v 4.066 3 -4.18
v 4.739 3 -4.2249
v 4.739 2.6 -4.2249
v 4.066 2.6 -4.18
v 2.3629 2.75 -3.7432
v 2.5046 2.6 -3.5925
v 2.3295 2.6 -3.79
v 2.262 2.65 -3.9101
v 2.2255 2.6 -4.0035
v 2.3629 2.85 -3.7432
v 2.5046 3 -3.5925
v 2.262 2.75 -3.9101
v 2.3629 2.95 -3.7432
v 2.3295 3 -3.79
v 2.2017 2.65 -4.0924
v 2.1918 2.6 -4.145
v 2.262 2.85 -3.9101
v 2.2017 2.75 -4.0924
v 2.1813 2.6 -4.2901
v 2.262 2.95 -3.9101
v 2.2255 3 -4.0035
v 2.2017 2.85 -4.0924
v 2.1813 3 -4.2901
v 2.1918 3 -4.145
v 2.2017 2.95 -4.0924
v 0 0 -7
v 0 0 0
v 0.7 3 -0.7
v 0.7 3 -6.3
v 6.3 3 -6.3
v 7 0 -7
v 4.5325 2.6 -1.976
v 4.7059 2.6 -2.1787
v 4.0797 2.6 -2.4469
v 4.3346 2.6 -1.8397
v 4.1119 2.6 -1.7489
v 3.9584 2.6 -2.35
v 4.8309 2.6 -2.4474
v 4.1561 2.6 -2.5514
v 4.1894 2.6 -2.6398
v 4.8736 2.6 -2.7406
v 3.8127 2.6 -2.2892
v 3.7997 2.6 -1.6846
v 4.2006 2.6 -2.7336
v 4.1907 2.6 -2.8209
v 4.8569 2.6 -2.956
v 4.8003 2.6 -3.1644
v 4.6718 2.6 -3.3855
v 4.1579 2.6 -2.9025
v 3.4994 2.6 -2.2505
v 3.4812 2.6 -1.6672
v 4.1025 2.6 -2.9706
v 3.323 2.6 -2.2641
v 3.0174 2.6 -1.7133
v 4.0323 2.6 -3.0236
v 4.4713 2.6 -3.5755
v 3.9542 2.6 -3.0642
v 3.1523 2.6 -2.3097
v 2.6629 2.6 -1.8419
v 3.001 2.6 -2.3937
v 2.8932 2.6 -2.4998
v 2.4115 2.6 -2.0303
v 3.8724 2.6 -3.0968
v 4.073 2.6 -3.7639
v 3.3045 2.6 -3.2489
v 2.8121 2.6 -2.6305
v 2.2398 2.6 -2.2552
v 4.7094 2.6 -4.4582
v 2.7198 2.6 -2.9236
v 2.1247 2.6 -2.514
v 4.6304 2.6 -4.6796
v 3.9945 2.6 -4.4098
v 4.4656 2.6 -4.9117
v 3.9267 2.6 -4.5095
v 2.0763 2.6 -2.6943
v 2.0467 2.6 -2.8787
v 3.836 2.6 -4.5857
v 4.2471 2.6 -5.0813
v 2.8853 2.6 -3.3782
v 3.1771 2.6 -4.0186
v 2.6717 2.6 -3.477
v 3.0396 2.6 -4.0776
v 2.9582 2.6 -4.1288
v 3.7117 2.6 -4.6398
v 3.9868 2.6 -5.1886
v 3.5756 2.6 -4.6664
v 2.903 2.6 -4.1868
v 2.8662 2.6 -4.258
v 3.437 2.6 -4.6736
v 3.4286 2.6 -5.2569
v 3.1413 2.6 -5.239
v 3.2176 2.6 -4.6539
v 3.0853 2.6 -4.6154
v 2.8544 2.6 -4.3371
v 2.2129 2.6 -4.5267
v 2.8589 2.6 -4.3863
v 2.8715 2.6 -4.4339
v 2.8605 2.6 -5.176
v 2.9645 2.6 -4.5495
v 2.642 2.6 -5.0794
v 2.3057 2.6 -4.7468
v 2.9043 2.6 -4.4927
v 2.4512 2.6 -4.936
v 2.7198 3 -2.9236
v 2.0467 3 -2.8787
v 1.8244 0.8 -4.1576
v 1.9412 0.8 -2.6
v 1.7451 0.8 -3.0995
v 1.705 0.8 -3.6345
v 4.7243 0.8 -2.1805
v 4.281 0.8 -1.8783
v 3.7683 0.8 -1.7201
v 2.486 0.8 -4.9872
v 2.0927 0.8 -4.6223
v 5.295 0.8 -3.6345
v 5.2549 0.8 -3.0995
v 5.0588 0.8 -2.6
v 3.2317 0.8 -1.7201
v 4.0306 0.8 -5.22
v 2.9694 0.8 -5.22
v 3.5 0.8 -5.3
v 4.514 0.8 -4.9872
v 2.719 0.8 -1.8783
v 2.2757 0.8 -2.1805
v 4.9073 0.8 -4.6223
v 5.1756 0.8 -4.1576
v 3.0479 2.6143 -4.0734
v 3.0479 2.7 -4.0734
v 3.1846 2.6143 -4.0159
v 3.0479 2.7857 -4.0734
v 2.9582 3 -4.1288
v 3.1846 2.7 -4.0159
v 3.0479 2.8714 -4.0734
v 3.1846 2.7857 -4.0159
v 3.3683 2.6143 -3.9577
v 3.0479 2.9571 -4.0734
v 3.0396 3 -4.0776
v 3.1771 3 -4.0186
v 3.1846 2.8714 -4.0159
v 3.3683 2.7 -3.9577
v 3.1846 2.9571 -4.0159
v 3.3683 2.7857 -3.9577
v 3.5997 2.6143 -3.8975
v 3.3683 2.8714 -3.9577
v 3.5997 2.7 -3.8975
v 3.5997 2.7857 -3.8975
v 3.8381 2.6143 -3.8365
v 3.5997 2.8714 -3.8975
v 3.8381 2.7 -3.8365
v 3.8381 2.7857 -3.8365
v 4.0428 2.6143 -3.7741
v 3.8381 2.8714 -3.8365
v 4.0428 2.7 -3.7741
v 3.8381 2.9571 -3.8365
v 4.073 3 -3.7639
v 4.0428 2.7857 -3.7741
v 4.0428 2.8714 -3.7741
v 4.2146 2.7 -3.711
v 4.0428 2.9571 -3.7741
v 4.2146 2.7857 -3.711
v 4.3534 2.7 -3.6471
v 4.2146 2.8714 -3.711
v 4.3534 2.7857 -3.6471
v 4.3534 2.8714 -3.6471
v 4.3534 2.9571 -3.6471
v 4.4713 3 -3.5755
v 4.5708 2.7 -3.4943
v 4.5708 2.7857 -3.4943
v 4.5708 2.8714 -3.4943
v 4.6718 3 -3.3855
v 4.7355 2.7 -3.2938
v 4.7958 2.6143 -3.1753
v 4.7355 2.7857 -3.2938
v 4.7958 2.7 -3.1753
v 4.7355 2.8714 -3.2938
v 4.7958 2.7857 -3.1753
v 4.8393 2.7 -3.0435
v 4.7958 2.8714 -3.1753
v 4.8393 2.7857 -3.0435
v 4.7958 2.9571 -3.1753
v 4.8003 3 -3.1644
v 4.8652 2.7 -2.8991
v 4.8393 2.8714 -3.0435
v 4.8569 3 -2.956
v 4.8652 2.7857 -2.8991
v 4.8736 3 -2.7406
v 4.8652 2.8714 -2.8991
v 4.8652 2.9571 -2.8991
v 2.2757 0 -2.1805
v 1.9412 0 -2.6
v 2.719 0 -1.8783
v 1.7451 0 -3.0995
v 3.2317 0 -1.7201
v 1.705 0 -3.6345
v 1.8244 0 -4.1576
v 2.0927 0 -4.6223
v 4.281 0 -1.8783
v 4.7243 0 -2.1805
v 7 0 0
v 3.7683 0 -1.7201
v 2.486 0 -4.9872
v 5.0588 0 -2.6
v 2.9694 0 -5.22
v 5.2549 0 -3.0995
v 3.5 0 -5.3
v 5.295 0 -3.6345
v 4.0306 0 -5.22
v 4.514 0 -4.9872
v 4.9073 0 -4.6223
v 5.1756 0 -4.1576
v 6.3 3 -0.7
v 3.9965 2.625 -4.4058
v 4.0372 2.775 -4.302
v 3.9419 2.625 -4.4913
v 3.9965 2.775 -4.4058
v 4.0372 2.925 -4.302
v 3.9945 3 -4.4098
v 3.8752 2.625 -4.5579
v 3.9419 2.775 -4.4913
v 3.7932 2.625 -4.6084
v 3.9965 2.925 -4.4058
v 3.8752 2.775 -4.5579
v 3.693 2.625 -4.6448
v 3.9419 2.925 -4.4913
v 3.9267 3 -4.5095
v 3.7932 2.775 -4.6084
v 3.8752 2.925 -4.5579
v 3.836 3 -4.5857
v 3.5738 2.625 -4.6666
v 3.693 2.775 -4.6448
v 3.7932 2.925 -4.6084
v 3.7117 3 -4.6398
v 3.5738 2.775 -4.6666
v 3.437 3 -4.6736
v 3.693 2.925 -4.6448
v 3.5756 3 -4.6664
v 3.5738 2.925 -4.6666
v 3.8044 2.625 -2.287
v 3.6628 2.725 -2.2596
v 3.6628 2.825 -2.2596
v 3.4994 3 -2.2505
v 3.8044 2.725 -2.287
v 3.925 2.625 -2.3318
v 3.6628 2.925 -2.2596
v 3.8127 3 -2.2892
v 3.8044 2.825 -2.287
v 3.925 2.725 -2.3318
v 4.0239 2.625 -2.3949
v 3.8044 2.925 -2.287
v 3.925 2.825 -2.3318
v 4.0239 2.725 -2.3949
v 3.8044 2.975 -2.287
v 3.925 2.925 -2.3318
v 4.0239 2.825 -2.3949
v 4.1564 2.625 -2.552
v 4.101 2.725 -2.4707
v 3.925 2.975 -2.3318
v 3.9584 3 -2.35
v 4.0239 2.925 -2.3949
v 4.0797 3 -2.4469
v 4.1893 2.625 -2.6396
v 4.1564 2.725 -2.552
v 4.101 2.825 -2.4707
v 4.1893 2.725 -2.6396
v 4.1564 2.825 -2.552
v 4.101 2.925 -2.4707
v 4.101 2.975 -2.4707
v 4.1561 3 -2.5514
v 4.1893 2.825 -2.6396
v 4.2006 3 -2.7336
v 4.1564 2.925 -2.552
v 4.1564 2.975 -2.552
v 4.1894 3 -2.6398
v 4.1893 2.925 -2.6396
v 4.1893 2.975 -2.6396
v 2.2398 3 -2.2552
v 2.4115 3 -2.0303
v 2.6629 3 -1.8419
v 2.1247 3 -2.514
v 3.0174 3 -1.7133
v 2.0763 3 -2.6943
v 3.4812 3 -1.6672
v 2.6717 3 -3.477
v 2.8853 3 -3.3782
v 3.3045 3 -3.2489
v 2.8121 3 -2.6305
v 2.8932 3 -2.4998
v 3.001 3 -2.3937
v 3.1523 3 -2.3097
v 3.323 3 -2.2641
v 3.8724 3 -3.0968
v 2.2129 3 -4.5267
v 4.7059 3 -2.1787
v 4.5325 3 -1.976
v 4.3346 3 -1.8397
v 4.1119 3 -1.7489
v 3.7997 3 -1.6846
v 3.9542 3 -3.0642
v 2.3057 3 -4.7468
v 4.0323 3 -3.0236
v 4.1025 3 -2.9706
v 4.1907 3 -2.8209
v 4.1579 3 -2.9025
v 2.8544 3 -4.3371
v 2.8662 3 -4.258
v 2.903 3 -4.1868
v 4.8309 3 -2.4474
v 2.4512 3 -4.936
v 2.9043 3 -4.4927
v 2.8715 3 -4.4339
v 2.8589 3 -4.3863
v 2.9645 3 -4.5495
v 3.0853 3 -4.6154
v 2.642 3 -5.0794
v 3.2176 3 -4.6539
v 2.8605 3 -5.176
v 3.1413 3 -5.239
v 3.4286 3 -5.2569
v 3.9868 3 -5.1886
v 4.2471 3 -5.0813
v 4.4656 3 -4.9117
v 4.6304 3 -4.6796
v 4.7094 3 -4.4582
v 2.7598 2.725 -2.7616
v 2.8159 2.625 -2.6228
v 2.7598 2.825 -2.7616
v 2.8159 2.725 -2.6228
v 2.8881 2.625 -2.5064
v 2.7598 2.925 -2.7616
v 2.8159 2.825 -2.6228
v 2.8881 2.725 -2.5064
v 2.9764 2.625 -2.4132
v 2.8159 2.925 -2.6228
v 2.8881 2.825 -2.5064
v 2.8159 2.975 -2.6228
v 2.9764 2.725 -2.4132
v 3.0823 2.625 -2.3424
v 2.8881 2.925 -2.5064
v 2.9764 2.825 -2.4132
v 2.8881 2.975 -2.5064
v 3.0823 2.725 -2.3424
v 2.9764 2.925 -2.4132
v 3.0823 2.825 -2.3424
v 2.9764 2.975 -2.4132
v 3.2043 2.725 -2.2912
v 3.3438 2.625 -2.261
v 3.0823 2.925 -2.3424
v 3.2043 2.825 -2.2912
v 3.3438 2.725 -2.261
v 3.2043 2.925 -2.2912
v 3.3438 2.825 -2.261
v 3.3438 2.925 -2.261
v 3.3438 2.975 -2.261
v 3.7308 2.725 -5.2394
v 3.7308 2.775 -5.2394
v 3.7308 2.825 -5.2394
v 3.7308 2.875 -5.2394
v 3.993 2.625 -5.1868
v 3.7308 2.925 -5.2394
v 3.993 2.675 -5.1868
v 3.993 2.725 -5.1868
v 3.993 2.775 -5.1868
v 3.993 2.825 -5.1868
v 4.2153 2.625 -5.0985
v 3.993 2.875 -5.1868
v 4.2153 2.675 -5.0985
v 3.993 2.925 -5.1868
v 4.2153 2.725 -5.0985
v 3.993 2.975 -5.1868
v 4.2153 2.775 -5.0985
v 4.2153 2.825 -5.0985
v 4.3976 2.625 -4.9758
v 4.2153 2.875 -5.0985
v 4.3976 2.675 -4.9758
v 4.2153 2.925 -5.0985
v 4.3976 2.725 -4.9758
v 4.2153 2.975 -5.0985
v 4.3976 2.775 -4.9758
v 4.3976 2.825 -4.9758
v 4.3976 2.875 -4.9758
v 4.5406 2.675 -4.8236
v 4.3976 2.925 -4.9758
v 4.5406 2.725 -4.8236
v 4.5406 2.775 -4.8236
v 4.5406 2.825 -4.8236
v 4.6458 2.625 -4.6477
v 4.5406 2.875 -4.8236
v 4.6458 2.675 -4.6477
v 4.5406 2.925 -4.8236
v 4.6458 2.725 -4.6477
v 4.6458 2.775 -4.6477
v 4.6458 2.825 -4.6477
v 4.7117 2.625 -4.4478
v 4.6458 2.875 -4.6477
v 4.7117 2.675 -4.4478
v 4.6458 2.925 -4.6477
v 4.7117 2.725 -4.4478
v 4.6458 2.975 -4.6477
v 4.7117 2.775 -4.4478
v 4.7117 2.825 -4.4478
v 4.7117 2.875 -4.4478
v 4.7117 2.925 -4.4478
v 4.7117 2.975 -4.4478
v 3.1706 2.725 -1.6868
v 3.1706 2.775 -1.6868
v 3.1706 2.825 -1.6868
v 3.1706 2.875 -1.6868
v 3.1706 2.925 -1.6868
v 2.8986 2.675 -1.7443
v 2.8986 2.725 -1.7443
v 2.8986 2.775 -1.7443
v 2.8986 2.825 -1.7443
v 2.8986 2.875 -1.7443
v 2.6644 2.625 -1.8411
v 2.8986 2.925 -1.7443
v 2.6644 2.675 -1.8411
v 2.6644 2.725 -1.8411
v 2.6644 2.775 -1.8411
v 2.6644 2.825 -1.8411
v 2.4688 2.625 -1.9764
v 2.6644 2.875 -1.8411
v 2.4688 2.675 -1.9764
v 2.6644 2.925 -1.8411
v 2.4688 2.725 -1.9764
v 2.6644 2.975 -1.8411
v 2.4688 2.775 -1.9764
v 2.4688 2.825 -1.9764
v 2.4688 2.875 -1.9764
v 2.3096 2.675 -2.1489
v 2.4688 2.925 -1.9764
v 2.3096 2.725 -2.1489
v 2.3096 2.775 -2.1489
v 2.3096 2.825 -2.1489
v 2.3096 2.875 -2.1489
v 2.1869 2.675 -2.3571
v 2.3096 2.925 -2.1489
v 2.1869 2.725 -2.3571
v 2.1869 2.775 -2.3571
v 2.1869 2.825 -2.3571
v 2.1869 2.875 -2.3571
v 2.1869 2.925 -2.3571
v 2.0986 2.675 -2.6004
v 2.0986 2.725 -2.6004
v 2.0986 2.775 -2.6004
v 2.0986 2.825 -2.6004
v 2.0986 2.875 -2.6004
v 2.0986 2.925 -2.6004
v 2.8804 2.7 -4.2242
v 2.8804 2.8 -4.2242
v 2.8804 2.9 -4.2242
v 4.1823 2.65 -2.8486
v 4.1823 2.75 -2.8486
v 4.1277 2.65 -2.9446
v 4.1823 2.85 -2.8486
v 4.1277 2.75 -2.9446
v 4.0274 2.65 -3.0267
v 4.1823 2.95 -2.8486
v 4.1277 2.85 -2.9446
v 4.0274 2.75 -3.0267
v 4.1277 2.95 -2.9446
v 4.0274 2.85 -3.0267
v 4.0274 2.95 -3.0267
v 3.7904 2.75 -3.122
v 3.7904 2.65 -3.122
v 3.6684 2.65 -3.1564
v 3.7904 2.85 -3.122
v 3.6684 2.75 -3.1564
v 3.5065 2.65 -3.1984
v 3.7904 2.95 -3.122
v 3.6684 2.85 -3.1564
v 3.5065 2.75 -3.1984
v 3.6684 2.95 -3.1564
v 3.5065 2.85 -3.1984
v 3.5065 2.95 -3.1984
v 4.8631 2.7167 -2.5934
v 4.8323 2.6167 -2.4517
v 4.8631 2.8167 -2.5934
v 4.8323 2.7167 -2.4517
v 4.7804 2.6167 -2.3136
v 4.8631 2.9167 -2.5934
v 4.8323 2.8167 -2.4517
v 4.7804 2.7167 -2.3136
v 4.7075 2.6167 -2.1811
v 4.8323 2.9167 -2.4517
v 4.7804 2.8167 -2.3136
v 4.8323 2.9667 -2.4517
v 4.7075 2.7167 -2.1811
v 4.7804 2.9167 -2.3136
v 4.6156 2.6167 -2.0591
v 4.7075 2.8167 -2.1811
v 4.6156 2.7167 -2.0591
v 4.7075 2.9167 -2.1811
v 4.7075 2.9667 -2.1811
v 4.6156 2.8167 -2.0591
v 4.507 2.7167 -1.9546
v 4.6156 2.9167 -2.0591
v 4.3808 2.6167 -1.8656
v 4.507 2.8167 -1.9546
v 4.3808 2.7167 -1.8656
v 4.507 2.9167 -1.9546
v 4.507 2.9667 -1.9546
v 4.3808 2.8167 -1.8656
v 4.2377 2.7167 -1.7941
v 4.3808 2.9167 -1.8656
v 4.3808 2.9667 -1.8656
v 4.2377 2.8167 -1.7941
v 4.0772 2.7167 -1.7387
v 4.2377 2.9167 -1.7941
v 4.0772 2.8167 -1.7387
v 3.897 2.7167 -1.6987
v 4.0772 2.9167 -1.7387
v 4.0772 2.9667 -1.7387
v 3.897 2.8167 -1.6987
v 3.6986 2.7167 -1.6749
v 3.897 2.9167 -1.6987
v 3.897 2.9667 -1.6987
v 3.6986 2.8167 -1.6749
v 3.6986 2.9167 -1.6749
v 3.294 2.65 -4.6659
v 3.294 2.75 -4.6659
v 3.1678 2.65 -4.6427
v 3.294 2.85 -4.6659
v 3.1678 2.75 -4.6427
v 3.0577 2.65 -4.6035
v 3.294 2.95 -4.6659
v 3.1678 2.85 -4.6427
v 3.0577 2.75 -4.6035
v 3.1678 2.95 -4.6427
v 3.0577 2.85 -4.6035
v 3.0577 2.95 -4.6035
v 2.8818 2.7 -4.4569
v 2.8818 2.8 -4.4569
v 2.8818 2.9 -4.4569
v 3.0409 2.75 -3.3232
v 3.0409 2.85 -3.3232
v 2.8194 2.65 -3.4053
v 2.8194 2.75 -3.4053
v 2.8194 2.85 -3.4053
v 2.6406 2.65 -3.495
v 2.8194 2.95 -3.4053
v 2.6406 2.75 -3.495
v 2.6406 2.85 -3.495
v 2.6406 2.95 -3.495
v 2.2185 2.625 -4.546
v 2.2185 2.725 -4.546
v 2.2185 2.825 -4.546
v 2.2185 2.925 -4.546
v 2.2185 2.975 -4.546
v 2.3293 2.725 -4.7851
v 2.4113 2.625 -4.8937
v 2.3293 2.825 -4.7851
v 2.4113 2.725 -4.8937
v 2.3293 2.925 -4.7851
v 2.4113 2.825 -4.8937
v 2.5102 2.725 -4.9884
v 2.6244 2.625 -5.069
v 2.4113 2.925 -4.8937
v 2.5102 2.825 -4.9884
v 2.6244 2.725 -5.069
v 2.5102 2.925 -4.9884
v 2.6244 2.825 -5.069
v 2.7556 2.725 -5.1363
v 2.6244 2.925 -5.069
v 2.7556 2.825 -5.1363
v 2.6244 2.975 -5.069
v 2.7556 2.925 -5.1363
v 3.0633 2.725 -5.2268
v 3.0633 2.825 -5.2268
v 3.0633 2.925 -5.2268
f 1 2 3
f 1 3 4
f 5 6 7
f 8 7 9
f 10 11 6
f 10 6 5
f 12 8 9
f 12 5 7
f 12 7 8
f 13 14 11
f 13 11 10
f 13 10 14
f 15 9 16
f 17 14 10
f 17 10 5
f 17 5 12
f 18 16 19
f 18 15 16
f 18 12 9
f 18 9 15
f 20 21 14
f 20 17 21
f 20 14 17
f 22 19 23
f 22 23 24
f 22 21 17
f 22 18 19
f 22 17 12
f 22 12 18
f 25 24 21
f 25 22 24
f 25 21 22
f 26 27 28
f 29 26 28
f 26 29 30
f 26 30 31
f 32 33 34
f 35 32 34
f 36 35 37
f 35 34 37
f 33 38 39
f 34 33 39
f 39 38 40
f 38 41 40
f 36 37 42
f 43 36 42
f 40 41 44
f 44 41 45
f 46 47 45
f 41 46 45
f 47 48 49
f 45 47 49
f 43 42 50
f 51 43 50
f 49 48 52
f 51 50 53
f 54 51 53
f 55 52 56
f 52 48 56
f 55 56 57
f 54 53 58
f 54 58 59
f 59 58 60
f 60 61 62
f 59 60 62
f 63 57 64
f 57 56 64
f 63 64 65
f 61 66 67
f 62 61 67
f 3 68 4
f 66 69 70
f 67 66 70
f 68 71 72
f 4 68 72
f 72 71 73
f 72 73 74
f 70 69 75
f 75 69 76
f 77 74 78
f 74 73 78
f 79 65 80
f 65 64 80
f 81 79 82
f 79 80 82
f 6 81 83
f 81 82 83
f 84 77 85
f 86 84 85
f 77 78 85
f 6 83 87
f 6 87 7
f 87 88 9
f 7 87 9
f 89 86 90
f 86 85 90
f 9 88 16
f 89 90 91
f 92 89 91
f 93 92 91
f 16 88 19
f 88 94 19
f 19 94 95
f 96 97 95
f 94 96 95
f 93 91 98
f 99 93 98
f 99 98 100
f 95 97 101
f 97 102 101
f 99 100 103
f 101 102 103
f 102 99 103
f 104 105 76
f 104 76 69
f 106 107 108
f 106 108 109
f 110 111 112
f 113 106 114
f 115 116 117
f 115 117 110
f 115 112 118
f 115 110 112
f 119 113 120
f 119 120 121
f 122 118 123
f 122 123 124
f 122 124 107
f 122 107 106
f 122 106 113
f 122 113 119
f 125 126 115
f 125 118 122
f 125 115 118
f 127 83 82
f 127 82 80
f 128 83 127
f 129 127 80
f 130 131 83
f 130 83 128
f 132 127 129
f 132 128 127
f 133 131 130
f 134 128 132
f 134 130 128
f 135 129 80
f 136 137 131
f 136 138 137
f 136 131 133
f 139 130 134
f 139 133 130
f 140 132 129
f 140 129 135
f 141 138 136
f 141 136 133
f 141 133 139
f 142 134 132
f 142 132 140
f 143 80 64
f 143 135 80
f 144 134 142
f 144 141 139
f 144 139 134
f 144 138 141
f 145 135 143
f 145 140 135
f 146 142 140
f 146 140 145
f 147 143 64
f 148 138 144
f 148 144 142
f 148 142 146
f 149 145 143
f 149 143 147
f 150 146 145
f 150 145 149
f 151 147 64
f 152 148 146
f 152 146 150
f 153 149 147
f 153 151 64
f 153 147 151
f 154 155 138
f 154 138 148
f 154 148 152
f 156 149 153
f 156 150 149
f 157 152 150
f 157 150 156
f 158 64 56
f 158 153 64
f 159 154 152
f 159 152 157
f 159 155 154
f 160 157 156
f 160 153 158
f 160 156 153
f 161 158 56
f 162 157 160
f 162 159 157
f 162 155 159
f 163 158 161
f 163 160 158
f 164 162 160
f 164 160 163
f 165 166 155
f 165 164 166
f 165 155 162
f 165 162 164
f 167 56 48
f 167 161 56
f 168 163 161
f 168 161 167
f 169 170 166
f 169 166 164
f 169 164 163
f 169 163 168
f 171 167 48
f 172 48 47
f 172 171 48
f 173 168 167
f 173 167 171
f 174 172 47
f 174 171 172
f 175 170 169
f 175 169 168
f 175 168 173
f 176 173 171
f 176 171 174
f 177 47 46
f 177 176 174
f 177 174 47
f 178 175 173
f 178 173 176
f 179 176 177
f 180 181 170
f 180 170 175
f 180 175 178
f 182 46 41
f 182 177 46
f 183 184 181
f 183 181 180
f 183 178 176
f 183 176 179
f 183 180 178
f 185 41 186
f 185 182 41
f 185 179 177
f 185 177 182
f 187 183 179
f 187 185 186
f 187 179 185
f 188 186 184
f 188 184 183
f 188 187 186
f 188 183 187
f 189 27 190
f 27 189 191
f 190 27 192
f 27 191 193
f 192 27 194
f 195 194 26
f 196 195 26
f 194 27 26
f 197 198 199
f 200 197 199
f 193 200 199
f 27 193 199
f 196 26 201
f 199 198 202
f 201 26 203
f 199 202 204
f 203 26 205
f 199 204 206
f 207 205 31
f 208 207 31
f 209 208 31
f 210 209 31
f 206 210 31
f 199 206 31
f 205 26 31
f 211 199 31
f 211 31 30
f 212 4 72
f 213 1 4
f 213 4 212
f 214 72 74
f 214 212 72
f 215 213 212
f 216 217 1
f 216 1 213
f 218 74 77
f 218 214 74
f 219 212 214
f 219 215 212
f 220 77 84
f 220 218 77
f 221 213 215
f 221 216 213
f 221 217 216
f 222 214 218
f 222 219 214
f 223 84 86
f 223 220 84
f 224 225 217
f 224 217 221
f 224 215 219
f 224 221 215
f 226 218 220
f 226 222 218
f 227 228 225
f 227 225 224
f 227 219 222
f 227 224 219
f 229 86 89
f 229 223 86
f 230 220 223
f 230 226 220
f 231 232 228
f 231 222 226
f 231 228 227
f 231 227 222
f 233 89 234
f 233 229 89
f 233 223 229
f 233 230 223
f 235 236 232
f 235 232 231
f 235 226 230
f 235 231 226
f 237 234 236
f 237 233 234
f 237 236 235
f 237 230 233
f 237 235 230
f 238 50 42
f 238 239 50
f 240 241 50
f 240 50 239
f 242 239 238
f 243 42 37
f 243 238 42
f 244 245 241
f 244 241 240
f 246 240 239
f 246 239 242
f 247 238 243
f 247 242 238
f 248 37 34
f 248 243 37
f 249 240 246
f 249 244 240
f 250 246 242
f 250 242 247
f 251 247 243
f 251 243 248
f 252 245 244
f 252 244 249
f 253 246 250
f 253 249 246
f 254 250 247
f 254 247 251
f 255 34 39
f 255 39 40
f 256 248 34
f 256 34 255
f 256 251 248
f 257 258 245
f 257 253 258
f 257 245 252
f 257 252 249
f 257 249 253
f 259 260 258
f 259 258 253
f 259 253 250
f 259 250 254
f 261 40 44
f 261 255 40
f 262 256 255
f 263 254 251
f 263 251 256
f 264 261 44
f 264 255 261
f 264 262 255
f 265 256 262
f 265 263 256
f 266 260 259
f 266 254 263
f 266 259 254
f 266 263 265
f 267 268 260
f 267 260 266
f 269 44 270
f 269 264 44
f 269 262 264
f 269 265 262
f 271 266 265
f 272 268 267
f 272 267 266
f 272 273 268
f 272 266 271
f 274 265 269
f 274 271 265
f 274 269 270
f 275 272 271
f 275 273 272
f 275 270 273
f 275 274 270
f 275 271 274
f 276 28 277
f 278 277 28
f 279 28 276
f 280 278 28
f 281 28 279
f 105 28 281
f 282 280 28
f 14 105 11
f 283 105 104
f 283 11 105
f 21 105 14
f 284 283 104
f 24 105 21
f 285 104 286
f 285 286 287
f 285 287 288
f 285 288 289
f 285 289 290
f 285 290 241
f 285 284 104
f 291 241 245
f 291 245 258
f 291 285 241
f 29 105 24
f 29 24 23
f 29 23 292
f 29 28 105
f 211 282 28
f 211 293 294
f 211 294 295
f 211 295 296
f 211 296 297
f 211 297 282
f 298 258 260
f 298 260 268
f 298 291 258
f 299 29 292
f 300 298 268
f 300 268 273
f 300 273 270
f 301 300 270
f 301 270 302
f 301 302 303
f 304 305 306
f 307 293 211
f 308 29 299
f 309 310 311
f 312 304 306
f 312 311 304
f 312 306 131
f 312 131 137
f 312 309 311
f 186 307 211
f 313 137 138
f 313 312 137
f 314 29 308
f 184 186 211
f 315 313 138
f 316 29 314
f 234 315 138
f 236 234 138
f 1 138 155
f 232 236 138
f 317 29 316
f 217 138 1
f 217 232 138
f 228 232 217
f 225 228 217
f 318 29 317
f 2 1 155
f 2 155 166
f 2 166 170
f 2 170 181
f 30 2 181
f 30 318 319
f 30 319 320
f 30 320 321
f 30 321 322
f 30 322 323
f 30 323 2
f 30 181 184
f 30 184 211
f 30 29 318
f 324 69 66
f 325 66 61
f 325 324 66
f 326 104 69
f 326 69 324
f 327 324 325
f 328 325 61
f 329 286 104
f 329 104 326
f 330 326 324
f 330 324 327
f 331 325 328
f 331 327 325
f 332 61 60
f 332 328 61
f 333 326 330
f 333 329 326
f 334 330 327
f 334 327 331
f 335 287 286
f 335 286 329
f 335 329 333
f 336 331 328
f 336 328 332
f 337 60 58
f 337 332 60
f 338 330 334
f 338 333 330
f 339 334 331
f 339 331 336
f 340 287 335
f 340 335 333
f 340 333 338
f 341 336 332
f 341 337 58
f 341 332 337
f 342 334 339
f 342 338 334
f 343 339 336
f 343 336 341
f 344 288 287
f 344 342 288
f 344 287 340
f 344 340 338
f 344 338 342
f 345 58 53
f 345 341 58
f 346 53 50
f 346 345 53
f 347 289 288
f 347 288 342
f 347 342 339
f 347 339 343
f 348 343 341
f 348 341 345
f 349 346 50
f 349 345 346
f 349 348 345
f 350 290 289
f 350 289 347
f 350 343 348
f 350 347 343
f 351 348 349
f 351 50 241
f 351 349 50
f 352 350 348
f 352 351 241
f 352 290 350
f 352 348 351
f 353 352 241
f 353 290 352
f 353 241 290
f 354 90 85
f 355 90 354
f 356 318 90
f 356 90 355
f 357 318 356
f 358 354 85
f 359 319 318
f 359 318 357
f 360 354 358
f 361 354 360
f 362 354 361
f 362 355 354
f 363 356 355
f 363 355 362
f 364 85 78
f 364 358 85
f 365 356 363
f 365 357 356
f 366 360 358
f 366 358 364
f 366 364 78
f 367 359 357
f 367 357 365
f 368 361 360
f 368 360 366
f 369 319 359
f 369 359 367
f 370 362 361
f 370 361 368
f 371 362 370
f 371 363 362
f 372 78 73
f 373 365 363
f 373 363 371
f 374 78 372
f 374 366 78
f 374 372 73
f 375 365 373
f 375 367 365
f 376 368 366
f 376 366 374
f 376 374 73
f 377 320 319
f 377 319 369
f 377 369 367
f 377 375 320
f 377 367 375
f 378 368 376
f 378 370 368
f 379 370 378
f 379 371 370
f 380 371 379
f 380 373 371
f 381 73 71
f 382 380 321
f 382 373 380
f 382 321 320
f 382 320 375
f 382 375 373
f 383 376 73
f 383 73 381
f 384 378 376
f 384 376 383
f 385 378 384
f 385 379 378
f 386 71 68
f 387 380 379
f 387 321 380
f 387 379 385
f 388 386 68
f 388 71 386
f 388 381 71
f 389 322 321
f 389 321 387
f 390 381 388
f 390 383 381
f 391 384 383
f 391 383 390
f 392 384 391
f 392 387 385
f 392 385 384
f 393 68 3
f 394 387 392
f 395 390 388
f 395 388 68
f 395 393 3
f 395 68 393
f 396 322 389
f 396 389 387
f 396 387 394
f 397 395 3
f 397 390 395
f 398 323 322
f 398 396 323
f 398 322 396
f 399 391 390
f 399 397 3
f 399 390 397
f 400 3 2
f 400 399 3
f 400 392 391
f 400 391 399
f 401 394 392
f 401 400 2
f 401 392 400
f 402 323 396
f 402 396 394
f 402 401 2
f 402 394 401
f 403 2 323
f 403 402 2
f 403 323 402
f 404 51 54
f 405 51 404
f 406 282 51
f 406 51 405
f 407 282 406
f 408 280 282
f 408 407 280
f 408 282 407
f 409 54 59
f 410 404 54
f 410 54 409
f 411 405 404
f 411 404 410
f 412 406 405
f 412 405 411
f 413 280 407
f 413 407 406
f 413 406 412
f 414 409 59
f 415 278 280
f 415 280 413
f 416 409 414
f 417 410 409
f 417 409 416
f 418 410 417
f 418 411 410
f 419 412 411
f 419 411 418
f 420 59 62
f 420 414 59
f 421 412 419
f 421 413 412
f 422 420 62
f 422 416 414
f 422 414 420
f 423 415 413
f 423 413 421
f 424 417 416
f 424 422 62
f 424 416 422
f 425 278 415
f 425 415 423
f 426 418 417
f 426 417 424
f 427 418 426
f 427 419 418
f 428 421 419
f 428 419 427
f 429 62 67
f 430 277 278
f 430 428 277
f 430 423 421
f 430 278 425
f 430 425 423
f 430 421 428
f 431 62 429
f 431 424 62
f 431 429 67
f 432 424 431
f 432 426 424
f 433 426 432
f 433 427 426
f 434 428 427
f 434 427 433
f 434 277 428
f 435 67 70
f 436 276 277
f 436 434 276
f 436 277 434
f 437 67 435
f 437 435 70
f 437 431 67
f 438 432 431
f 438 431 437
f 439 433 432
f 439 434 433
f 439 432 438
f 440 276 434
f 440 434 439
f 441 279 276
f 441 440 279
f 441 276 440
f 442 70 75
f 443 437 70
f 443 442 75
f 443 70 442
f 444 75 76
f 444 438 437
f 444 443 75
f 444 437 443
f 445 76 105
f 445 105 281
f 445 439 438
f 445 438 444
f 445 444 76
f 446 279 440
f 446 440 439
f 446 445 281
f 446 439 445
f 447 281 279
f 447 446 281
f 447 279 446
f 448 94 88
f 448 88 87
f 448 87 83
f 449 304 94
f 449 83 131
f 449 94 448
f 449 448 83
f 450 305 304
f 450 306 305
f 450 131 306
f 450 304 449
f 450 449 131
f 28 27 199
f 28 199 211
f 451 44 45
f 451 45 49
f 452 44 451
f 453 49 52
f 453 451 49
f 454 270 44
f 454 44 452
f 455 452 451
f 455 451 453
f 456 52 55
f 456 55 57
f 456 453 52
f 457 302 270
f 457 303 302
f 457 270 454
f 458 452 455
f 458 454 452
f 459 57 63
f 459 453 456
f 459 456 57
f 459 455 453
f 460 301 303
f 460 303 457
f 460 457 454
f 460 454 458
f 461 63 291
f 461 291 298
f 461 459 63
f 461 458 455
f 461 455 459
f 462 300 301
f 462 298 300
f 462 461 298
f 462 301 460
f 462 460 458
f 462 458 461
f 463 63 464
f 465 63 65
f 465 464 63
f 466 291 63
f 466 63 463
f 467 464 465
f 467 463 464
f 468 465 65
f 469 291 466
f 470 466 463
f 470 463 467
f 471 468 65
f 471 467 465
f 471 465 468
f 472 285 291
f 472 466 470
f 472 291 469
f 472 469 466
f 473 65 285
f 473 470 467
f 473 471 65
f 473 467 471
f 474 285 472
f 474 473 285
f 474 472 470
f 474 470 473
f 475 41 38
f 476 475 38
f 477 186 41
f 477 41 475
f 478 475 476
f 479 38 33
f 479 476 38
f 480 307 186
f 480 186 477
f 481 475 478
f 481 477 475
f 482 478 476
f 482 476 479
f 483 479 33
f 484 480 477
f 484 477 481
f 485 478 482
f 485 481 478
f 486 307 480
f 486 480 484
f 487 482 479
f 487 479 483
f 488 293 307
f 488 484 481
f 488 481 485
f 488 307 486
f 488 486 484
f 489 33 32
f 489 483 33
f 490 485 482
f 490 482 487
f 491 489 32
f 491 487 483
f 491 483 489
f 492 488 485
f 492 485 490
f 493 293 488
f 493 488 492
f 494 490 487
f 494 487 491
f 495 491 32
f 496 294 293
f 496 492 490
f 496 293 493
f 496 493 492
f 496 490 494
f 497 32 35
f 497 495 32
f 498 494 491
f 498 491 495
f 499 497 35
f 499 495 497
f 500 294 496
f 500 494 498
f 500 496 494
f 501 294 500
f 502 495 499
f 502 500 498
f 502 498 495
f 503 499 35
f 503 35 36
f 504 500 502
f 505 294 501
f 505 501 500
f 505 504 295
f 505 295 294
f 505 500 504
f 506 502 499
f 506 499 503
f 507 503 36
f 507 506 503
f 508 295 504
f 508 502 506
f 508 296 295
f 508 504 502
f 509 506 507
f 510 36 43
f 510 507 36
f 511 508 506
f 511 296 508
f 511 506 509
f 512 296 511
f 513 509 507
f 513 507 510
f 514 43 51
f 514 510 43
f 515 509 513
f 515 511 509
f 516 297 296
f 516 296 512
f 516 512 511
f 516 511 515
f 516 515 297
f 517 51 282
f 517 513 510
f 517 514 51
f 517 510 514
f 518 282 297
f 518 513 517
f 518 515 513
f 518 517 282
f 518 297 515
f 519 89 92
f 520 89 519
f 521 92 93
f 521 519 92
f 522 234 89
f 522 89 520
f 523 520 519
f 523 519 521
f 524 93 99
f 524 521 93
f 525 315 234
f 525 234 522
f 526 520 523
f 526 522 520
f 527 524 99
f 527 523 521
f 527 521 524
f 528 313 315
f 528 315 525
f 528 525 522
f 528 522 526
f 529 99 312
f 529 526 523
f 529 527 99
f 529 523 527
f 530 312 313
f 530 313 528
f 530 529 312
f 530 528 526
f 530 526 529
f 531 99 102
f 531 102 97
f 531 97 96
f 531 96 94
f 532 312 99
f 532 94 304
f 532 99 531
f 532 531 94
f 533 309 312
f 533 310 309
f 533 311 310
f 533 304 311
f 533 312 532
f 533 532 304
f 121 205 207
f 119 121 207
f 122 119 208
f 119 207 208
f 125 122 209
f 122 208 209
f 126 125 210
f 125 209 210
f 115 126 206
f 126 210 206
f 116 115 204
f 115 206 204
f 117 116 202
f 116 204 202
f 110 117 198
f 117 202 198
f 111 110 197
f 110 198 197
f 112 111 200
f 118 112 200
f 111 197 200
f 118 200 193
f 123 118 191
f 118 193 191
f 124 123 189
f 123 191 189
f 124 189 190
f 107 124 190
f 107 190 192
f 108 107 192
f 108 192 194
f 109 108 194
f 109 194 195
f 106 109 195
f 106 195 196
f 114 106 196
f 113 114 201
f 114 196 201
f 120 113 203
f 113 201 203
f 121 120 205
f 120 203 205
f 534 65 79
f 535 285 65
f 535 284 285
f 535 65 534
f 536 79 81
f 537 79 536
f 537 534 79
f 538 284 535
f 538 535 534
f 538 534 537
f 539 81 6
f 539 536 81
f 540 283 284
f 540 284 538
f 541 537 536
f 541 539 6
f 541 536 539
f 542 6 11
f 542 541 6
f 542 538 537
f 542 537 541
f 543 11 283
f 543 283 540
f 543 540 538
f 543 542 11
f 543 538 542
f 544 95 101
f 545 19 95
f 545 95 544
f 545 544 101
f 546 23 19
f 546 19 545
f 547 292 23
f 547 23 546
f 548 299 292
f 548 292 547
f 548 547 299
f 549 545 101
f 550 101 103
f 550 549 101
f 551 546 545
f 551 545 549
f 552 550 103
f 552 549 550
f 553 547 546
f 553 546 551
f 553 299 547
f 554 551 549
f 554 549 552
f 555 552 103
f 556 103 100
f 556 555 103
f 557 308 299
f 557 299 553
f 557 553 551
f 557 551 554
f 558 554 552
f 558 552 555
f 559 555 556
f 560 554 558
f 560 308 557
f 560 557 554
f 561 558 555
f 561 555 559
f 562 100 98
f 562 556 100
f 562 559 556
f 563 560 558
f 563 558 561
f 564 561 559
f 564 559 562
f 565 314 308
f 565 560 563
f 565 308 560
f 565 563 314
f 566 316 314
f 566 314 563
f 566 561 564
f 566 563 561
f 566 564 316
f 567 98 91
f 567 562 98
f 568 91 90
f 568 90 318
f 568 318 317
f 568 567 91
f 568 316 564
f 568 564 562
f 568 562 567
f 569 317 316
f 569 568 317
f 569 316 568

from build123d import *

# Parameters (mm, degrees)
SKETCH1_W           = 7
SKETCH1_H           = 7
BOSS_EXTRUDE1_DEPTH = 3
CUT_EXTRUDE1_DEPTH  = 7
CUT_EXTRUDE2_DEPTH  = 11
SKETCH4_R           = 1.8
CUT_EXTRUDE3_DEPTH  = 0.8
CUT_EXTRUDE4_DEPTH  = 0.4


with BuildPart() as part:
    # Sketch1 → Boss-Extrude1 (new body)
    with BuildSketch(Plane(origin=(0, 0, 0), x_dir=(1, 0, 0), z_dir=(0, 1, 0))):
        with Locations((3.5, 3.5)):
            Rectangle(SKETCH1_W, SKETCH1_H)
    extrude(amount=BOSS_EXTRUDE1_DEPTH)

    # Sketch2 → Cut-Extrude1 (cut)
    with BuildSketch(Plane.XY):
        Polygon((0, 0), (0.7, 3), (0, 3), align=None)
        Polygon((7, 0), (6.3, 3), (7, 3), align=None)
    extrude(amount=-CUT_EXTRUDE1_DEPTH, mode=Mode.SUBTRACT)

    # Sketch3 → Cut-Extrude2 (cut)
    with BuildSketch(Plane(origin=(0, 0, 0), x_dir=(0, 0, -1), z_dir=(1, 0, 0))):
        Polygon((0, 0), (0.7, 3), (0, 3), align=None)
        Polygon((7, 3), (6.3, 3), (7, 0), align=None)
    extrude(amount=CUT_EXTRUDE2_DEPTH, mode=Mode.SUBTRACT)

    # Sketch4 → Cut-Extrude3 (cut)
    with BuildSketch(Plane.XZ):
        with Locations(Location((3.5, -3.5, 0), (0, 0, 270))):
            Circle(SKETCH4_R)
    extrude(amount=-CUT_EXTRUDE3_DEPTH, mode=Mode.SUBTRACT)

    # Sketch5 → Cut-Extrude4 (cut)
    with BuildSketch(Plane(origin=(0, 3, 0), x_dir=(1, 0, 0), z_dir=(0, 1, 0))):
        with BuildLine():
            Line((2.046721013, 2.878720245), (2.719797936, 2.92359204))
            add(Edge.make_bspline(
                [(2.719797936, 2.92359204), (2.725160149, 2.895432871), (2.735575908, 2.840735478), (2.758717767, 2.762784225), (2.784190549, 2.69011155), (2.81463192, 2.623496744), (2.847957445, 2.561708471), (2.886904829, 2.506506929), (2.928757004, 2.456129675), (2.975585733, 2.412386043), (3.026605026, 2.374074766), (3.082069463, 2.341401632), (3.14137804, 2.313122445), (3.204675773, 2.289835431), (3.272615043, 2.272451562), (3.344603998, 2.260083969), (3.420745884, 2.252164104), (3.4727828, 2.251073777), (3.499445372, 2.250515117)],
                knots=[0, 0, 0, 0, 1.204560339, 2.339781841, 3.415289417, 4.440034832, 5.416475564, 6.362424008, 7.275913008, 8.16578645, 9.05021719, 9.95355393, 10.867835453, 11.809845306, 12.784702352, 13.812224031, 14.87903166, 16, 16, 16, 16], degree=3))
            add(Edge.make_bspline(
                [(3.499445372, 2.250515117), (3.527509416, 2.250821294), (3.582095427, 2.251416824), (3.661196592, 2.258804896), (3.735159775, 2.269389104), (3.803331854, 2.286143658), (3.866985877, 2.304880975), (3.924540945, 2.330515622), (3.976928433, 2.36008148), (4.024013382, 2.393631069), (4.06510446, 2.430839971), (4.101052986, 2.469684857), (4.132361778, 2.5093265), (4.157004013, 2.551524023), (4.176946643, 2.594570783), (4.190127325, 2.639750939), (4.199031656, 2.686027058), (4.200052723, 2.717653631), (4.200567167, 2.733588033)],
                knots=[0, 0, 0, 0, 1.417779877, 2.757654889, 4.012140507, 5.189587551, 6.302846416, 7.360586765, 8.365575446, 9.33904572, 10.275781718, 11.161696098, 12.012180333, 12.822428111, 13.625933072, 14.403138519, 15.195454004, 16, 16, 16, 16], degree=3))
            add(Edge.make_bspline(
                [(4.200567167, 2.733588033), (4.199936245, 2.753552546), (4.198701939, 2.792610195), (4.183842132, 2.848447381), (4.161557458, 2.900178921), (4.12800444, 2.94704074), (4.082900924, 2.989865612), (4.025366896, 3.029927231), (3.953796381, 3.065967021), (3.900700369, 3.086070082), (3.872442167, 3.096769123)],
                knots=[0, 0, 0, 0, 0.90494901, 1.770400303, 2.607161909, 3.452839393, 4.36912122, 5.420987164, 6.627424851, 8, 8, 8, 8], degree=3))
            add(Edge.make_bspline(
                [(3.872442167, 3.096769123), (3.860317321, 3.100832215), (3.833183883, 3.109924755), (3.786897121, 3.12292623), (3.731143485, 3.139161617), (3.665117302, 3.157615727), (3.588840772, 3.176489423), (3.503165804, 3.199739676), (3.407047926, 3.222875577), (3.339803742, 3.239954494), (3.304533513, 3.248912553)],
                knots=[0, 0, 0, 0, 0.521821638, 1.167752076, 1.961721917, 2.891982557, 3.96540661, 5.168436773, 6.514817513, 8, 8, 8, 8], degree=3))
            add(Edge.make_bspline(
                [(3.304533513, 3.248912553), (3.258601207, 3.260380777), (3.169982333, 3.282506842), (3.043591527, 3.321867543), (2.927183282, 3.360974579), (2.821878423, 3.403407811), (2.726515392, 3.446291426), (2.642636716, 3.492636137), (2.568492031, 3.540035098), (2.525286202, 3.57546224), (2.504553545, 3.592462232)],
                knots=[0, 0, 0, 0, 1.293880989, 2.496331788, 3.617634808, 4.64976062, 5.598842568, 6.473791081, 7.267636666, 8, 8, 8, 8], degree=3))
            add(Edge.make_bspline(
                [(2.504553545, 3.592462232), (2.478842356, 3.616535508), (2.428433193, 3.663733391), (2.362077353, 3.741288571), (2.306320379, 3.82321321), (2.260426285, 3.908902595), (2.225088701, 3.998850035), (2.200041876, 4.092453462), (2.18383066, 4.189957168), (2.182176417, 4.256359502), (2.181336398, 4.290078418)],
                knots=[0, 0, 0, 0, 1.064429417, 2.086912298, 3.078678339, 4.055528992, 5.020032834, 5.993708893, 6.981211098, 8, 8, 8, 8], degree=3))
            add(Edge.make_bspline(
                [(2.181336398, 4.290078418), (2.182972343, 4.333710293), (2.18621757, 4.420262908), (2.215978417, 4.547483438), (2.262337684, 4.670241451), (2.316103441, 4.767715859), (2.367760734, 4.841455617), (2.410658355, 4.894370593), (2.457785536, 4.943893923), (2.509787819, 4.988817578), (2.564734232, 5.031772991), (2.624753609, 5.069917913), (2.688144219, 5.105848319), (2.779877653, 5.148442144), (2.904426487, 5.192829094), (3.06647121, 5.230244475), (3.242905826, 5.252735952), (3.365228488, 5.25549518), (3.428632071, 5.256925373)],
                knots=[0, 0, 0, 0, 1.180131776, 2.341029169, 3.518901375, 4.725685298, 5.343762192, 5.955650671, 6.568945152, 7.192346361, 7.815201106, 8.455999361, 9.116257477, 9.787318263, 11.192748436, 12.688084276, 14.283332633, 16, 16, 16, 16], degree=3))
            add(Edge.make_bspline(
                [(3.428632071, 5.256925373), (3.480546978, 5.25623114), (3.581520363, 5.254880873), (3.727893013, 5.241226755), (3.86461301, 5.219975735), (3.991200587, 5.189469994), (4.107714725, 5.149163904), (4.214607068, 5.10115173), (4.311786782, 5.044149232), (4.3980708, 4.977829293), (4.474941591, 4.904715813), (4.541999061, 4.824854673), (4.599499587, 4.739254471), (4.647814268, 4.647977762), (4.68575566, 4.550555251), (4.713622114, 4.447108501), (4.732053229, 4.337881002), (4.736673044, 4.263037228), (4.739028705, 4.224874091)],
                knots=[0, 0, 0, 0, 1.325124071, 2.577337985, 3.749592149, 4.855247722, 5.896868755, 6.892903601, 7.842551483, 8.766257401, 9.665194363, 10.546067736, 11.423174165, 12.293291263, 13.177512979, 14.086532529, 15.024315359, 16, 16, 16, 16], degree=3))
            Line((4.739028705, 4.224874091), (4.065951782, 4.180002296))
            add(Edge.make_bspline(
                [(4.065951782, 4.180002296), (4.062068972, 4.201108183), (4.054501777, 4.242241362), (4.038048624, 4.301152432), (4.019490266, 4.355638451), (3.997768669, 4.405699072), (3.971531605, 4.45043766), (3.942978139, 4.491261716), (3.911320612, 4.527627281), (3.875510829, 4.55853855), (3.83677937, 4.586666537), (3.792639157, 4.60921177), (3.744939713, 4.630128784), (3.691866364, 4.645853249), (3.634438311, 4.65832646), (3.572622102, 4.667573288), (3.506289601, 4.672088109), (3.460655286, 4.673079253), (3.437045532, 4.67359204)],
                knots=[0, 0, 0, 0, 1.151066407, 2.24330871, 3.278475654, 4.238599069, 5.165719782, 6.056502506, 6.909492653, 7.744782051, 8.590364415, 9.471203867, 10.39832458, 11.382154319, 12.435022857, 13.550631277, 14.73277401, 16, 16, 16, 16], degree=3))
            add(Edge.make_bspline(
                [(3.437045532, 4.67359204), (3.412497837, 4.673139334), (3.364739198, 4.672258574), (3.295142133, 4.666853479), (3.229854863, 4.656876194), (3.168556746, 4.643888244), (3.11132966, 4.626219037), (3.058294374, 4.604674333), (3.009208245, 4.579309585), (2.979277664, 4.559353476), (2.964489443, 4.549493482)],
                knots=[0, 0, 0, 0, 1.186678824, 2.308736671, 3.37120409, 4.377216403, 5.334874112, 6.262130804, 7.141346615, 8, 8, 8, 8], degree=3))
            add(Edge.make_bspline(
                [(2.964489443, 4.549493482), (2.947565565, 4.53602445), (2.914789266, 4.509939115), (2.879515034, 4.458142509), (2.858279864, 4.399639797), (2.855723971, 4.358268553), (2.854413321, 4.337053578)],
                knots=[0, 0, 0, 0, 1.037857257, 2.010007357, 2.979541333, 4, 4, 4, 4], degree=3))
            add(Edge.make_bspline(
                [(2.854413321, 4.337053578), (2.855485194, 4.317226776), (2.857596612, 4.27817113), (2.878892988, 4.22269174), (2.911643913, 4.171286094), (2.942244281, 4.143361874), (2.958179346, 4.128820405)],
                knots=[0, 0, 0, 0, 0.98538058, 1.941042925, 2.927803204, 4, 4, 4, 4], degree=3))
            add(Edge.make_bspline(
                [(2.958179346, 4.128820405), (2.970825874, 4.119382262), (2.9990856, 4.098291942), (3.050851816, 4.07148415), (3.113334997, 4.042449691), (3.187959609, 4.014065302), (3.274229699, 3.985733602), (3.372150512, 3.956152032), (3.481782274, 3.926173301), (3.600330525, 3.897140369), (3.720690389, 3.868602665), (3.835546491, 3.837402899), (3.942346149, 3.806985541), (4.040594163, 3.775103213), (4.130796984, 3.744065866), (4.212516439, 3.712188275), (4.286313644, 3.681143069), (4.372369366, 3.63845371), (4.469904872, 3.580629249), (4.572133086, 3.496571752), (4.662540895, 3.402085635), (4.725534654, 3.312991744), (4.76880807, 3.236368627), (4.796671585, 3.175291081), (4.82077571, 3.110930748), (4.840396402, 3.043216506), (4.854616683, 2.972053072), (4.866384793, 2.897984135), (4.872397339, 2.820394537), (4.873224033, 2.767483952), (4.87364409, 2.740599251)],
                knots=[0, 0, 0, 0, 0.511875881, 1.143829537, 1.88775736, 2.750598373, 3.734912702, 4.837306479, 6.073130119, 7.42648979, 8.801963576, 10.091065733, 11.292408984, 12.408830014, 13.446061236, 14.39066453, 15.257936293, 16.045629259, 17.510392066, 18.929669597, 20.331293837, 21.746891395, 22.460690638, 23.187651344, 23.925159671, 24.69163991, 25.474819891, 26.281170188, 27.126635539, 28, 28, 28, 28], degree=3))
            add(Edge.make_bspline(
                [(4.87364409, 2.740599251), (4.873066499, 2.715805547), (4.871919459, 2.666567652), (4.86390363, 2.593486185), (4.851507352, 2.52170251), (4.833156603, 2.451126638), (4.80881246, 2.381897405), (4.78140289, 2.313015643), (4.747128767, 2.245983517), (4.708120139, 2.18074551), (4.665091851, 2.117350577), (4.616332808, 2.058870196), (4.564706926, 2.003353319), (4.506915449, 1.953908582), (4.44652713, 1.906532418), (4.38077987, 1.864575291), (4.311214031, 1.826607806), (4.237389761, 1.792913428), (4.159045311, 1.763551823), (4.076282436, 1.737417953), (3.988355491, 1.716029388), (3.895997661, 1.697696694), (3.798870959, 1.683755153), (3.697096814, 1.674020716), (3.590652088, 1.66853108), (3.51814807, 1.667637137), (3.481216205, 1.667181783)],
                knots=[0, 0, 0, 0, 0.900570041, 1.788444861, 2.667795364, 3.545012114, 4.433698372, 5.332345486, 6.235991676, 7.164928091, 8.092777575, 9.015680987, 9.928493428, 10.842962589, 11.775229507, 12.714851019, 13.672254427, 14.652424454, 15.660007982, 16.709910502, 17.803296389, 18.945495772, 20.129342395, 21.366102753, 22.658353839, 24, 24, 24, 24], degree=3))
            add(Edge.make_bspline(
                [(3.481216205, 1.667181783), (3.427892291, 1.668052387), (3.324069365, 1.669747473), (3.173233299, 1.684919824), (3.031759055, 1.708142203), (2.899876942, 1.741845708), (2.777425768, 1.785113401), (2.664461381, 1.838409645), (2.561530178, 1.902052856), (2.4673573, 1.97449958), (2.383197452, 2.057069979), (2.307520748, 2.148053225), (2.241348087, 2.248268606), (2.184722964, 2.357559374), (2.136213798, 2.475334702), (2.096207822, 2.601648673), (2.066085424, 2.737103735), (2.053287453, 2.830698323), (2.046721013, 2.878720245)],
                knots=[0, 0, 0, 0, 1.217954099, 2.371385517, 3.459848295, 4.490682126, 5.476952527, 6.422732854, 7.338496285, 8.236688651, 9.131557988, 10.026443255, 10.935708282, 11.869506048, 12.834296687, 13.842423496, 14.892981177, 16, 16, 16, 16], degree=3))
        make_face()
    extrude(amount=-CUT_EXTRUDE4_DEPTH, mode=Mode.SUBTRACT)


solid = part.part
